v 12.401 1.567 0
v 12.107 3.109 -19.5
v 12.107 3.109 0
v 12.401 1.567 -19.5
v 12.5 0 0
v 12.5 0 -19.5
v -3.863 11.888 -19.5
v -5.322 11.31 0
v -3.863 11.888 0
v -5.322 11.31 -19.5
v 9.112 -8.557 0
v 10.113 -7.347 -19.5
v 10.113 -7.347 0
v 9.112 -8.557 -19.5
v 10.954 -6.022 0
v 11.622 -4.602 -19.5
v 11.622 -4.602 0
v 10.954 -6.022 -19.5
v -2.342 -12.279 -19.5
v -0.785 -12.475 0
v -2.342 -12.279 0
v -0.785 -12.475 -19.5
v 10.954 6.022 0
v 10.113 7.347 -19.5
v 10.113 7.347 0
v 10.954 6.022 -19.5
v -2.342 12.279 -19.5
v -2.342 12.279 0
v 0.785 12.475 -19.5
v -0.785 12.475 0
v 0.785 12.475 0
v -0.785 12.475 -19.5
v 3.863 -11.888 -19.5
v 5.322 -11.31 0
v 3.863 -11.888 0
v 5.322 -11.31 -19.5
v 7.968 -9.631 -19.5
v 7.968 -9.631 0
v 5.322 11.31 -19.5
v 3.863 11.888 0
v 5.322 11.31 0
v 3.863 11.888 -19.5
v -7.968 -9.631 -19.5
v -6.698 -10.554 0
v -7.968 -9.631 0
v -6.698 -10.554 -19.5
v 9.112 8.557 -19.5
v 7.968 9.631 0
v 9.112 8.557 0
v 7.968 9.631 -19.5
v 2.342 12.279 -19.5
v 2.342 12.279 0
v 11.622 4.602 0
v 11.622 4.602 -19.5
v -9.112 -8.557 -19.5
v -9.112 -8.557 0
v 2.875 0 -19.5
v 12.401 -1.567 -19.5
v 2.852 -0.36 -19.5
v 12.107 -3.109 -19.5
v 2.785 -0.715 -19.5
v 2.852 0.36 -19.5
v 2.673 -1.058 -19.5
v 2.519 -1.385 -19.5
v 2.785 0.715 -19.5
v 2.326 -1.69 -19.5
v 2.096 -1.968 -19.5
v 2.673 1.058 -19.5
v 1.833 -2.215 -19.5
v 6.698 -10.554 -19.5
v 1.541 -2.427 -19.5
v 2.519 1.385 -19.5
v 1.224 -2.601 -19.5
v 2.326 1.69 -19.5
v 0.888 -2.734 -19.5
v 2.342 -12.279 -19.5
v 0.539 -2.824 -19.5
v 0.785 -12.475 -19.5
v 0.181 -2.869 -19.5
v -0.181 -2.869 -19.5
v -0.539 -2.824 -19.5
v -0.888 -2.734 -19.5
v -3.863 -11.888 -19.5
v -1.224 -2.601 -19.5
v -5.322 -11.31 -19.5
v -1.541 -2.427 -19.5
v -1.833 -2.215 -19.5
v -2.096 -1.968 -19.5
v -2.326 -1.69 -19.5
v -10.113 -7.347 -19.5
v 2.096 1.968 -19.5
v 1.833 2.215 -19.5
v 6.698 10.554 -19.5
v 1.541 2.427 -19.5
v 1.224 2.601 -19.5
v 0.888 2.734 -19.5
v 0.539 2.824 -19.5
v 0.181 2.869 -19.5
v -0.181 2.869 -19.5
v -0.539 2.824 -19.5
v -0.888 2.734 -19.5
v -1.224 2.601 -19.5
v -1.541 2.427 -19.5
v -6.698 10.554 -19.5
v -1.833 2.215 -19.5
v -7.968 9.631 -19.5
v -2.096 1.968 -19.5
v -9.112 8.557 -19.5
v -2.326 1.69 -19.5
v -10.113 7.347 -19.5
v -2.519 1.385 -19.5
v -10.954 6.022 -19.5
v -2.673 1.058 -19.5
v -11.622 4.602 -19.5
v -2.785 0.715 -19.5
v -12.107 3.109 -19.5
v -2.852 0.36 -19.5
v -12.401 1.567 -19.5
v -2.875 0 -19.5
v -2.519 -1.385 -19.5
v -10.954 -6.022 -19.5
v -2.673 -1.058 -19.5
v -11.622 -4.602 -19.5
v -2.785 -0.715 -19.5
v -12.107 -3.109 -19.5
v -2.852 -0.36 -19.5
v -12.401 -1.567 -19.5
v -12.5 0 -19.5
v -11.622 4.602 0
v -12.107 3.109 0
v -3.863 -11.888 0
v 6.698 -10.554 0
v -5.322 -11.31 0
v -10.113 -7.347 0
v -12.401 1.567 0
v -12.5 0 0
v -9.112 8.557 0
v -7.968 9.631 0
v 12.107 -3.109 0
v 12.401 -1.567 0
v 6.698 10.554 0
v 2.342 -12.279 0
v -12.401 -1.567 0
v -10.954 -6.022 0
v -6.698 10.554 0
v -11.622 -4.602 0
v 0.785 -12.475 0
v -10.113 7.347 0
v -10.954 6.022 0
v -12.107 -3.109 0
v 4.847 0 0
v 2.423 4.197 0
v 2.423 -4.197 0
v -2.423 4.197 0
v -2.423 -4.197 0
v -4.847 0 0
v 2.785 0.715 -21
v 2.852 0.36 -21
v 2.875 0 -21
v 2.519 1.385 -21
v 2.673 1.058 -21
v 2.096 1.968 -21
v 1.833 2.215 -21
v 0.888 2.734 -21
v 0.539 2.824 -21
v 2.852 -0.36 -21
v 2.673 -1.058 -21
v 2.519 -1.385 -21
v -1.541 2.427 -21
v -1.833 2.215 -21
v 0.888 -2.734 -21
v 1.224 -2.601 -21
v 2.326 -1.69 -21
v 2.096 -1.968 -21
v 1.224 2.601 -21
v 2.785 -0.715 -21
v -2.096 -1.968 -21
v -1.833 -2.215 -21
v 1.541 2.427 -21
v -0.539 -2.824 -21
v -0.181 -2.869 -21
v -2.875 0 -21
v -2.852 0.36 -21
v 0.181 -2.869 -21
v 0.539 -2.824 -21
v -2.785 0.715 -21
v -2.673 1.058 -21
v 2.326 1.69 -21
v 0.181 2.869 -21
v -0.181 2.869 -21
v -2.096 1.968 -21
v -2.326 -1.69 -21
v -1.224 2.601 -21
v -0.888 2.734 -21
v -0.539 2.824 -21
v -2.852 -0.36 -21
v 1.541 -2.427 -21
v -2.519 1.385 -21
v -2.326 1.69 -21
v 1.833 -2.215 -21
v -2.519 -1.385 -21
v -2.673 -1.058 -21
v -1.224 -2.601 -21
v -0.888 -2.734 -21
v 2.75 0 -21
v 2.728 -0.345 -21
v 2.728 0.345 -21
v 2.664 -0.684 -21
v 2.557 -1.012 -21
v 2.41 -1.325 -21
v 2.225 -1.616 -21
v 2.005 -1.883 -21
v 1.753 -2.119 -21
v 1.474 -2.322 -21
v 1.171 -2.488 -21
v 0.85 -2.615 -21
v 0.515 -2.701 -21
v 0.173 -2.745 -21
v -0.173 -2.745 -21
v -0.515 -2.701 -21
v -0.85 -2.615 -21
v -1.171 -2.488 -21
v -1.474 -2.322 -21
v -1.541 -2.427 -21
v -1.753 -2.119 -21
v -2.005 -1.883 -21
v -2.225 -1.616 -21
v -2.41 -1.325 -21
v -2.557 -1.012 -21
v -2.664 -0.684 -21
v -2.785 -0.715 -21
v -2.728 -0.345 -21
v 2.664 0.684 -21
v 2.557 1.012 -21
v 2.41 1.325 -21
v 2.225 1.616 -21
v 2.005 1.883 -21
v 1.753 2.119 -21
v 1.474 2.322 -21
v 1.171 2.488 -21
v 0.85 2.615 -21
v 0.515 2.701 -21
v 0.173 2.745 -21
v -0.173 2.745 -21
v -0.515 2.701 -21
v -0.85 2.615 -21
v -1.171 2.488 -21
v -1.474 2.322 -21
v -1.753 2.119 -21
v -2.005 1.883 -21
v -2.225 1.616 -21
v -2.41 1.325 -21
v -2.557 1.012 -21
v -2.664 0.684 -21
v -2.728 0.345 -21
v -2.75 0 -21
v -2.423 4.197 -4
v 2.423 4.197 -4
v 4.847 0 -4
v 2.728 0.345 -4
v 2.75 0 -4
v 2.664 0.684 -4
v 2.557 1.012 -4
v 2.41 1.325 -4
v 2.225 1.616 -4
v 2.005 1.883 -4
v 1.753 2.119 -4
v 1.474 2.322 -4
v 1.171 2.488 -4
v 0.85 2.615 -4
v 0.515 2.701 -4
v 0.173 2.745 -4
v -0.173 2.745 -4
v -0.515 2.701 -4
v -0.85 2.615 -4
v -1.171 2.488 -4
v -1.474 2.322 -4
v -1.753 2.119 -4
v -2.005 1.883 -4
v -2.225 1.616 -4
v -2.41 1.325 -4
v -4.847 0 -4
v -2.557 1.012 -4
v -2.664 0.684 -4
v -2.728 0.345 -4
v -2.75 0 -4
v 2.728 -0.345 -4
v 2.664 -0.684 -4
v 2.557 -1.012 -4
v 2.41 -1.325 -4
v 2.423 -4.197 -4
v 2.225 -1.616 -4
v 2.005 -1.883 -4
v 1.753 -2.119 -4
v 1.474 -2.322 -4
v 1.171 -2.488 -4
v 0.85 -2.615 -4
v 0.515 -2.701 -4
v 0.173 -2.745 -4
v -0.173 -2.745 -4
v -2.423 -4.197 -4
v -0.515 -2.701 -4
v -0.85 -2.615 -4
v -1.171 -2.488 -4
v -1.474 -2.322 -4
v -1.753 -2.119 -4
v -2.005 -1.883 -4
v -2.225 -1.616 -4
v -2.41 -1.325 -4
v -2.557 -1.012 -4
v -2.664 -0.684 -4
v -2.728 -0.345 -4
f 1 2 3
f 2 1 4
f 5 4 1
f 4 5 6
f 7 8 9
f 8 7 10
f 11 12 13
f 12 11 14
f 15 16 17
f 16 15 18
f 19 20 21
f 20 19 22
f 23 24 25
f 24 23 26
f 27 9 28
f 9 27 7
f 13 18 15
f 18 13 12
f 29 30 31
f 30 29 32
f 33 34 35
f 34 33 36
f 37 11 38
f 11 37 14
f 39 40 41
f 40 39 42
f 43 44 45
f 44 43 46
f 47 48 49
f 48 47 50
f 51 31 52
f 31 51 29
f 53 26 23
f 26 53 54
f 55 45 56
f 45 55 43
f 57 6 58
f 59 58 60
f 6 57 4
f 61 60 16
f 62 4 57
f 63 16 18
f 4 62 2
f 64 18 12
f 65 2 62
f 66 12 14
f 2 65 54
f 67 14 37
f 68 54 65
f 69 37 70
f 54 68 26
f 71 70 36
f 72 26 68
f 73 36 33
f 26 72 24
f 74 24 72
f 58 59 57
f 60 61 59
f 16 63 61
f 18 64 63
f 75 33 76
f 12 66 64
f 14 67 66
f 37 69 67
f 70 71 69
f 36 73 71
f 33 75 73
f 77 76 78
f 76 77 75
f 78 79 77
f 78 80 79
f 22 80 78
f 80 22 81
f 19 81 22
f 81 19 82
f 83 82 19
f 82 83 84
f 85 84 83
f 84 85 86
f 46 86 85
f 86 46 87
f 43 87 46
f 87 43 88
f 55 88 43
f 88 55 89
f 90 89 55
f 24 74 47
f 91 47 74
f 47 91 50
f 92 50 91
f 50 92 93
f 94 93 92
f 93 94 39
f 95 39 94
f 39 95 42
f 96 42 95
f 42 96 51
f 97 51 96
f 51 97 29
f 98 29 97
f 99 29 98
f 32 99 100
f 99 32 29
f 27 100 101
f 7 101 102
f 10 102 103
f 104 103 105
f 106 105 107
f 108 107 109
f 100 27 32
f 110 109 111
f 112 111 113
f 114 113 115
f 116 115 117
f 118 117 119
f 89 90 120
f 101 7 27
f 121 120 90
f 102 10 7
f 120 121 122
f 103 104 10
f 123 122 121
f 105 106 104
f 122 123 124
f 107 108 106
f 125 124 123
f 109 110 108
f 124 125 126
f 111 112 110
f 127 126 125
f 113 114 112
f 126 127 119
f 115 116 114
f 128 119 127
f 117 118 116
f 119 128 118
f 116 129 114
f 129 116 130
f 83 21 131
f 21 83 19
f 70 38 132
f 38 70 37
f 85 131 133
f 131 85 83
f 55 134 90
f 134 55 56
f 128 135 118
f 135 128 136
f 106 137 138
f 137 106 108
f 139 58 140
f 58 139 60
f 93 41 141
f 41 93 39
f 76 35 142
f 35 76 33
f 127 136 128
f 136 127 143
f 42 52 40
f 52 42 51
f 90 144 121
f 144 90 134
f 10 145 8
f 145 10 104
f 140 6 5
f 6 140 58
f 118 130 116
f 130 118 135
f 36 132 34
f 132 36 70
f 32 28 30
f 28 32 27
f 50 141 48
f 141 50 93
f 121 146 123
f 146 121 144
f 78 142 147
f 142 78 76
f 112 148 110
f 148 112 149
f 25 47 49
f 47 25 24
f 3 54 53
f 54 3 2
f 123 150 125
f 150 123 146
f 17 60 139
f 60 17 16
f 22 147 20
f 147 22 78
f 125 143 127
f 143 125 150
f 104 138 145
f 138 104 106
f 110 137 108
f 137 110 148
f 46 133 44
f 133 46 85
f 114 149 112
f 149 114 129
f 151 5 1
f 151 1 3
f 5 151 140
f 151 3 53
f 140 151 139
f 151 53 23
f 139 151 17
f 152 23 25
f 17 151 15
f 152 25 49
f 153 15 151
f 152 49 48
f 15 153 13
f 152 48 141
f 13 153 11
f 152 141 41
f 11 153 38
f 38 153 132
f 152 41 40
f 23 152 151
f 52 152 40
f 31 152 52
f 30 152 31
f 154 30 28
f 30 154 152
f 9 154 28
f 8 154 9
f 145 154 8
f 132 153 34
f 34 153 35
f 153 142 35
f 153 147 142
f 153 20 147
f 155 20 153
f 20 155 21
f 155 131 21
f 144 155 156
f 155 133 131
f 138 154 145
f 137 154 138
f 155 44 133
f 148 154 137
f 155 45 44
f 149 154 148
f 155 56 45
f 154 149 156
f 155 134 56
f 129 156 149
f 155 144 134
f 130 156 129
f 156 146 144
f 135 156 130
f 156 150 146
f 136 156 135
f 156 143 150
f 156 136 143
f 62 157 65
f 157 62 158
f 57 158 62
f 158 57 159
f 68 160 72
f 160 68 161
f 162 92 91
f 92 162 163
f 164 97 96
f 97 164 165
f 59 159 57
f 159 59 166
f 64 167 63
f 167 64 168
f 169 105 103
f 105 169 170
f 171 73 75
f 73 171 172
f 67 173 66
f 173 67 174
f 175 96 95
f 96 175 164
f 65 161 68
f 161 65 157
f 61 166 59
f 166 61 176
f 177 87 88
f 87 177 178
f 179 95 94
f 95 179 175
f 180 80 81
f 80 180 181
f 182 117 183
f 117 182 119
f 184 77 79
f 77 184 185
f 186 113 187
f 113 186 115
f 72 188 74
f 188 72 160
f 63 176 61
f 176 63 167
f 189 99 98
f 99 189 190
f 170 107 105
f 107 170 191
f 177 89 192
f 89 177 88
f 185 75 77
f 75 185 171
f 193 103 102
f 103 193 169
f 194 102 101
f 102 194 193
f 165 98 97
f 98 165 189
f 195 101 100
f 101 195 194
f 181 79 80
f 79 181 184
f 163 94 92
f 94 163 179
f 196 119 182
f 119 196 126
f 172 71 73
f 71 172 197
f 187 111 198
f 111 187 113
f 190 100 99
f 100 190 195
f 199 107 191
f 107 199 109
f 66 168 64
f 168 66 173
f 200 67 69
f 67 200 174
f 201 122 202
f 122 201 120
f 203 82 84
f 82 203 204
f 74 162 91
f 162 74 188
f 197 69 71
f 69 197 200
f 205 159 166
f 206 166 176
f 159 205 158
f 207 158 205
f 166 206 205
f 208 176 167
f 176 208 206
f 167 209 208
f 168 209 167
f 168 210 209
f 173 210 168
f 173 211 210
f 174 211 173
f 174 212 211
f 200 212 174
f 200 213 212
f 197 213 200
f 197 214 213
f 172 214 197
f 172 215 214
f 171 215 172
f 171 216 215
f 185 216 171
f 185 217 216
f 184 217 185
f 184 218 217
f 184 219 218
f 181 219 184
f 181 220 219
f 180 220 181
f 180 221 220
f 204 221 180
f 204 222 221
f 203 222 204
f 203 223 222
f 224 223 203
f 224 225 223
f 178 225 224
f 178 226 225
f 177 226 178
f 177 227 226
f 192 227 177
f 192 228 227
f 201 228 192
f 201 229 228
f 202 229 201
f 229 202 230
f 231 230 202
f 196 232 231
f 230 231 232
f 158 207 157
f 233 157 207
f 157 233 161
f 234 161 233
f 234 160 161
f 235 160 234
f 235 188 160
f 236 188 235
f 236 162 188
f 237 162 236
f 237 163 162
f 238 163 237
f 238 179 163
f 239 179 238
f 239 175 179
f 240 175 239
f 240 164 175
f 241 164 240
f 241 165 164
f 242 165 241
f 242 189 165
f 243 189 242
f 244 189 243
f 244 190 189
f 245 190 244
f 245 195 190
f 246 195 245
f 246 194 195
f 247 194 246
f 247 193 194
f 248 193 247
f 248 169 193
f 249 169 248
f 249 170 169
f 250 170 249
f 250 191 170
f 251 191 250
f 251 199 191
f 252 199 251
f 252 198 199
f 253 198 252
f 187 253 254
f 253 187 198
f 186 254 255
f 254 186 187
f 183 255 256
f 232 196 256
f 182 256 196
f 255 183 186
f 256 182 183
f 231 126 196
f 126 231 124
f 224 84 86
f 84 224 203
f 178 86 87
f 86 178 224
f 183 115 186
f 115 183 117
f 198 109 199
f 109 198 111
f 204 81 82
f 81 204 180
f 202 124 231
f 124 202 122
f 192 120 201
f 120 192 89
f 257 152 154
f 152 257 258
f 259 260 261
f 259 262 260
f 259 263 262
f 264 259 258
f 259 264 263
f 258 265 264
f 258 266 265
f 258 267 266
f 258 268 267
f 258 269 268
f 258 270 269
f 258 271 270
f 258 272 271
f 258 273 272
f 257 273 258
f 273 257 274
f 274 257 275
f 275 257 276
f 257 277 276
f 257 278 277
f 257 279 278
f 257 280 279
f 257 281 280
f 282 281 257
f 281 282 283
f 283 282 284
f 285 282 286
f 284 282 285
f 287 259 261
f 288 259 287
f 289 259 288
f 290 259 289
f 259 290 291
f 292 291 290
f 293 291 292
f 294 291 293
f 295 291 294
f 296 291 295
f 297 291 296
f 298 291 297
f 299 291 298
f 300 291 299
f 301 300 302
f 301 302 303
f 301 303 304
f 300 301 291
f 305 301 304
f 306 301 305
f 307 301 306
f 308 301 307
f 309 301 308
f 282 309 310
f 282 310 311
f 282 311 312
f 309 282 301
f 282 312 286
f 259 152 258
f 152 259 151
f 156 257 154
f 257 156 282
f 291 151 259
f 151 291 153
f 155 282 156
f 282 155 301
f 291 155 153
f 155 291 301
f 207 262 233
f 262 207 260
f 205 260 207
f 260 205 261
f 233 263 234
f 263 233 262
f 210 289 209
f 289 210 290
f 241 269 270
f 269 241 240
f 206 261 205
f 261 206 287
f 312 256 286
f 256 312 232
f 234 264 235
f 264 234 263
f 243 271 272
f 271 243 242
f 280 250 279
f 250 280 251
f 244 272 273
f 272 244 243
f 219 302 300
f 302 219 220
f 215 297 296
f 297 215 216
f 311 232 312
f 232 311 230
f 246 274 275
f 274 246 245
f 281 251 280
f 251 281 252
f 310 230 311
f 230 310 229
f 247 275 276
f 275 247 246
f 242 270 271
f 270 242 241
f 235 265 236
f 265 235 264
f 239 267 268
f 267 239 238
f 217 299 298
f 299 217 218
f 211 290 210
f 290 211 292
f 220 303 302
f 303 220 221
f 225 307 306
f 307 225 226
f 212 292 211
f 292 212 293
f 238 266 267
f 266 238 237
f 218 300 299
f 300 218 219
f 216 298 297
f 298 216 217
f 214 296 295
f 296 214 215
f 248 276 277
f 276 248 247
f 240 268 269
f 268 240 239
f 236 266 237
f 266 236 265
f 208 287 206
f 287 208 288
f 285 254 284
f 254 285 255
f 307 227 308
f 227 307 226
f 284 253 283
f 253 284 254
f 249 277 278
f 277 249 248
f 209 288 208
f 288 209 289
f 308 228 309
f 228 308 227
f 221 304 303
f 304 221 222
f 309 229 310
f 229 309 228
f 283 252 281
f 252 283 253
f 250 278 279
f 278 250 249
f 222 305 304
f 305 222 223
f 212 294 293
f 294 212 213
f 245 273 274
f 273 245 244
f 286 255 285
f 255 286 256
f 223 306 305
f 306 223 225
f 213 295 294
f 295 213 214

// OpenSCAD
$fn = 50;

difference() {
	union() {
		translate(v = [0, 0, -19.5]) {
			cylinder(h = 19.5, r = 12.5);
		}
		#translate(v = [0, 0, -21.0]) {
			cylinder(h = 21, r = 2.875);
		}
	}
	union() {
		translate(v = [0, 0, 0]) {
			rotate(a = [0, 0, 0]) {
				difference() {
					union() {
						translate(v = [0, 0, -4]) {
							linear_extrude(height = 4) {
								polygon(points = [[4.8468, 0.0], [2.4234000000000004, 4.197451927062417], [-2.423399999999999, 4.197451927062417], [-4.8468, 5.935618106107392e-16], [-2.423400000000002, -4.197451927062416], [2.423399999999997, -4.197451927062419]]);
							}
						}
					}
					union();
				}
			}
		}
		#translate(v = [0, 0, -100.0]) {
			cylinder(h = 200, r = 2.75);
		}
	}
}
